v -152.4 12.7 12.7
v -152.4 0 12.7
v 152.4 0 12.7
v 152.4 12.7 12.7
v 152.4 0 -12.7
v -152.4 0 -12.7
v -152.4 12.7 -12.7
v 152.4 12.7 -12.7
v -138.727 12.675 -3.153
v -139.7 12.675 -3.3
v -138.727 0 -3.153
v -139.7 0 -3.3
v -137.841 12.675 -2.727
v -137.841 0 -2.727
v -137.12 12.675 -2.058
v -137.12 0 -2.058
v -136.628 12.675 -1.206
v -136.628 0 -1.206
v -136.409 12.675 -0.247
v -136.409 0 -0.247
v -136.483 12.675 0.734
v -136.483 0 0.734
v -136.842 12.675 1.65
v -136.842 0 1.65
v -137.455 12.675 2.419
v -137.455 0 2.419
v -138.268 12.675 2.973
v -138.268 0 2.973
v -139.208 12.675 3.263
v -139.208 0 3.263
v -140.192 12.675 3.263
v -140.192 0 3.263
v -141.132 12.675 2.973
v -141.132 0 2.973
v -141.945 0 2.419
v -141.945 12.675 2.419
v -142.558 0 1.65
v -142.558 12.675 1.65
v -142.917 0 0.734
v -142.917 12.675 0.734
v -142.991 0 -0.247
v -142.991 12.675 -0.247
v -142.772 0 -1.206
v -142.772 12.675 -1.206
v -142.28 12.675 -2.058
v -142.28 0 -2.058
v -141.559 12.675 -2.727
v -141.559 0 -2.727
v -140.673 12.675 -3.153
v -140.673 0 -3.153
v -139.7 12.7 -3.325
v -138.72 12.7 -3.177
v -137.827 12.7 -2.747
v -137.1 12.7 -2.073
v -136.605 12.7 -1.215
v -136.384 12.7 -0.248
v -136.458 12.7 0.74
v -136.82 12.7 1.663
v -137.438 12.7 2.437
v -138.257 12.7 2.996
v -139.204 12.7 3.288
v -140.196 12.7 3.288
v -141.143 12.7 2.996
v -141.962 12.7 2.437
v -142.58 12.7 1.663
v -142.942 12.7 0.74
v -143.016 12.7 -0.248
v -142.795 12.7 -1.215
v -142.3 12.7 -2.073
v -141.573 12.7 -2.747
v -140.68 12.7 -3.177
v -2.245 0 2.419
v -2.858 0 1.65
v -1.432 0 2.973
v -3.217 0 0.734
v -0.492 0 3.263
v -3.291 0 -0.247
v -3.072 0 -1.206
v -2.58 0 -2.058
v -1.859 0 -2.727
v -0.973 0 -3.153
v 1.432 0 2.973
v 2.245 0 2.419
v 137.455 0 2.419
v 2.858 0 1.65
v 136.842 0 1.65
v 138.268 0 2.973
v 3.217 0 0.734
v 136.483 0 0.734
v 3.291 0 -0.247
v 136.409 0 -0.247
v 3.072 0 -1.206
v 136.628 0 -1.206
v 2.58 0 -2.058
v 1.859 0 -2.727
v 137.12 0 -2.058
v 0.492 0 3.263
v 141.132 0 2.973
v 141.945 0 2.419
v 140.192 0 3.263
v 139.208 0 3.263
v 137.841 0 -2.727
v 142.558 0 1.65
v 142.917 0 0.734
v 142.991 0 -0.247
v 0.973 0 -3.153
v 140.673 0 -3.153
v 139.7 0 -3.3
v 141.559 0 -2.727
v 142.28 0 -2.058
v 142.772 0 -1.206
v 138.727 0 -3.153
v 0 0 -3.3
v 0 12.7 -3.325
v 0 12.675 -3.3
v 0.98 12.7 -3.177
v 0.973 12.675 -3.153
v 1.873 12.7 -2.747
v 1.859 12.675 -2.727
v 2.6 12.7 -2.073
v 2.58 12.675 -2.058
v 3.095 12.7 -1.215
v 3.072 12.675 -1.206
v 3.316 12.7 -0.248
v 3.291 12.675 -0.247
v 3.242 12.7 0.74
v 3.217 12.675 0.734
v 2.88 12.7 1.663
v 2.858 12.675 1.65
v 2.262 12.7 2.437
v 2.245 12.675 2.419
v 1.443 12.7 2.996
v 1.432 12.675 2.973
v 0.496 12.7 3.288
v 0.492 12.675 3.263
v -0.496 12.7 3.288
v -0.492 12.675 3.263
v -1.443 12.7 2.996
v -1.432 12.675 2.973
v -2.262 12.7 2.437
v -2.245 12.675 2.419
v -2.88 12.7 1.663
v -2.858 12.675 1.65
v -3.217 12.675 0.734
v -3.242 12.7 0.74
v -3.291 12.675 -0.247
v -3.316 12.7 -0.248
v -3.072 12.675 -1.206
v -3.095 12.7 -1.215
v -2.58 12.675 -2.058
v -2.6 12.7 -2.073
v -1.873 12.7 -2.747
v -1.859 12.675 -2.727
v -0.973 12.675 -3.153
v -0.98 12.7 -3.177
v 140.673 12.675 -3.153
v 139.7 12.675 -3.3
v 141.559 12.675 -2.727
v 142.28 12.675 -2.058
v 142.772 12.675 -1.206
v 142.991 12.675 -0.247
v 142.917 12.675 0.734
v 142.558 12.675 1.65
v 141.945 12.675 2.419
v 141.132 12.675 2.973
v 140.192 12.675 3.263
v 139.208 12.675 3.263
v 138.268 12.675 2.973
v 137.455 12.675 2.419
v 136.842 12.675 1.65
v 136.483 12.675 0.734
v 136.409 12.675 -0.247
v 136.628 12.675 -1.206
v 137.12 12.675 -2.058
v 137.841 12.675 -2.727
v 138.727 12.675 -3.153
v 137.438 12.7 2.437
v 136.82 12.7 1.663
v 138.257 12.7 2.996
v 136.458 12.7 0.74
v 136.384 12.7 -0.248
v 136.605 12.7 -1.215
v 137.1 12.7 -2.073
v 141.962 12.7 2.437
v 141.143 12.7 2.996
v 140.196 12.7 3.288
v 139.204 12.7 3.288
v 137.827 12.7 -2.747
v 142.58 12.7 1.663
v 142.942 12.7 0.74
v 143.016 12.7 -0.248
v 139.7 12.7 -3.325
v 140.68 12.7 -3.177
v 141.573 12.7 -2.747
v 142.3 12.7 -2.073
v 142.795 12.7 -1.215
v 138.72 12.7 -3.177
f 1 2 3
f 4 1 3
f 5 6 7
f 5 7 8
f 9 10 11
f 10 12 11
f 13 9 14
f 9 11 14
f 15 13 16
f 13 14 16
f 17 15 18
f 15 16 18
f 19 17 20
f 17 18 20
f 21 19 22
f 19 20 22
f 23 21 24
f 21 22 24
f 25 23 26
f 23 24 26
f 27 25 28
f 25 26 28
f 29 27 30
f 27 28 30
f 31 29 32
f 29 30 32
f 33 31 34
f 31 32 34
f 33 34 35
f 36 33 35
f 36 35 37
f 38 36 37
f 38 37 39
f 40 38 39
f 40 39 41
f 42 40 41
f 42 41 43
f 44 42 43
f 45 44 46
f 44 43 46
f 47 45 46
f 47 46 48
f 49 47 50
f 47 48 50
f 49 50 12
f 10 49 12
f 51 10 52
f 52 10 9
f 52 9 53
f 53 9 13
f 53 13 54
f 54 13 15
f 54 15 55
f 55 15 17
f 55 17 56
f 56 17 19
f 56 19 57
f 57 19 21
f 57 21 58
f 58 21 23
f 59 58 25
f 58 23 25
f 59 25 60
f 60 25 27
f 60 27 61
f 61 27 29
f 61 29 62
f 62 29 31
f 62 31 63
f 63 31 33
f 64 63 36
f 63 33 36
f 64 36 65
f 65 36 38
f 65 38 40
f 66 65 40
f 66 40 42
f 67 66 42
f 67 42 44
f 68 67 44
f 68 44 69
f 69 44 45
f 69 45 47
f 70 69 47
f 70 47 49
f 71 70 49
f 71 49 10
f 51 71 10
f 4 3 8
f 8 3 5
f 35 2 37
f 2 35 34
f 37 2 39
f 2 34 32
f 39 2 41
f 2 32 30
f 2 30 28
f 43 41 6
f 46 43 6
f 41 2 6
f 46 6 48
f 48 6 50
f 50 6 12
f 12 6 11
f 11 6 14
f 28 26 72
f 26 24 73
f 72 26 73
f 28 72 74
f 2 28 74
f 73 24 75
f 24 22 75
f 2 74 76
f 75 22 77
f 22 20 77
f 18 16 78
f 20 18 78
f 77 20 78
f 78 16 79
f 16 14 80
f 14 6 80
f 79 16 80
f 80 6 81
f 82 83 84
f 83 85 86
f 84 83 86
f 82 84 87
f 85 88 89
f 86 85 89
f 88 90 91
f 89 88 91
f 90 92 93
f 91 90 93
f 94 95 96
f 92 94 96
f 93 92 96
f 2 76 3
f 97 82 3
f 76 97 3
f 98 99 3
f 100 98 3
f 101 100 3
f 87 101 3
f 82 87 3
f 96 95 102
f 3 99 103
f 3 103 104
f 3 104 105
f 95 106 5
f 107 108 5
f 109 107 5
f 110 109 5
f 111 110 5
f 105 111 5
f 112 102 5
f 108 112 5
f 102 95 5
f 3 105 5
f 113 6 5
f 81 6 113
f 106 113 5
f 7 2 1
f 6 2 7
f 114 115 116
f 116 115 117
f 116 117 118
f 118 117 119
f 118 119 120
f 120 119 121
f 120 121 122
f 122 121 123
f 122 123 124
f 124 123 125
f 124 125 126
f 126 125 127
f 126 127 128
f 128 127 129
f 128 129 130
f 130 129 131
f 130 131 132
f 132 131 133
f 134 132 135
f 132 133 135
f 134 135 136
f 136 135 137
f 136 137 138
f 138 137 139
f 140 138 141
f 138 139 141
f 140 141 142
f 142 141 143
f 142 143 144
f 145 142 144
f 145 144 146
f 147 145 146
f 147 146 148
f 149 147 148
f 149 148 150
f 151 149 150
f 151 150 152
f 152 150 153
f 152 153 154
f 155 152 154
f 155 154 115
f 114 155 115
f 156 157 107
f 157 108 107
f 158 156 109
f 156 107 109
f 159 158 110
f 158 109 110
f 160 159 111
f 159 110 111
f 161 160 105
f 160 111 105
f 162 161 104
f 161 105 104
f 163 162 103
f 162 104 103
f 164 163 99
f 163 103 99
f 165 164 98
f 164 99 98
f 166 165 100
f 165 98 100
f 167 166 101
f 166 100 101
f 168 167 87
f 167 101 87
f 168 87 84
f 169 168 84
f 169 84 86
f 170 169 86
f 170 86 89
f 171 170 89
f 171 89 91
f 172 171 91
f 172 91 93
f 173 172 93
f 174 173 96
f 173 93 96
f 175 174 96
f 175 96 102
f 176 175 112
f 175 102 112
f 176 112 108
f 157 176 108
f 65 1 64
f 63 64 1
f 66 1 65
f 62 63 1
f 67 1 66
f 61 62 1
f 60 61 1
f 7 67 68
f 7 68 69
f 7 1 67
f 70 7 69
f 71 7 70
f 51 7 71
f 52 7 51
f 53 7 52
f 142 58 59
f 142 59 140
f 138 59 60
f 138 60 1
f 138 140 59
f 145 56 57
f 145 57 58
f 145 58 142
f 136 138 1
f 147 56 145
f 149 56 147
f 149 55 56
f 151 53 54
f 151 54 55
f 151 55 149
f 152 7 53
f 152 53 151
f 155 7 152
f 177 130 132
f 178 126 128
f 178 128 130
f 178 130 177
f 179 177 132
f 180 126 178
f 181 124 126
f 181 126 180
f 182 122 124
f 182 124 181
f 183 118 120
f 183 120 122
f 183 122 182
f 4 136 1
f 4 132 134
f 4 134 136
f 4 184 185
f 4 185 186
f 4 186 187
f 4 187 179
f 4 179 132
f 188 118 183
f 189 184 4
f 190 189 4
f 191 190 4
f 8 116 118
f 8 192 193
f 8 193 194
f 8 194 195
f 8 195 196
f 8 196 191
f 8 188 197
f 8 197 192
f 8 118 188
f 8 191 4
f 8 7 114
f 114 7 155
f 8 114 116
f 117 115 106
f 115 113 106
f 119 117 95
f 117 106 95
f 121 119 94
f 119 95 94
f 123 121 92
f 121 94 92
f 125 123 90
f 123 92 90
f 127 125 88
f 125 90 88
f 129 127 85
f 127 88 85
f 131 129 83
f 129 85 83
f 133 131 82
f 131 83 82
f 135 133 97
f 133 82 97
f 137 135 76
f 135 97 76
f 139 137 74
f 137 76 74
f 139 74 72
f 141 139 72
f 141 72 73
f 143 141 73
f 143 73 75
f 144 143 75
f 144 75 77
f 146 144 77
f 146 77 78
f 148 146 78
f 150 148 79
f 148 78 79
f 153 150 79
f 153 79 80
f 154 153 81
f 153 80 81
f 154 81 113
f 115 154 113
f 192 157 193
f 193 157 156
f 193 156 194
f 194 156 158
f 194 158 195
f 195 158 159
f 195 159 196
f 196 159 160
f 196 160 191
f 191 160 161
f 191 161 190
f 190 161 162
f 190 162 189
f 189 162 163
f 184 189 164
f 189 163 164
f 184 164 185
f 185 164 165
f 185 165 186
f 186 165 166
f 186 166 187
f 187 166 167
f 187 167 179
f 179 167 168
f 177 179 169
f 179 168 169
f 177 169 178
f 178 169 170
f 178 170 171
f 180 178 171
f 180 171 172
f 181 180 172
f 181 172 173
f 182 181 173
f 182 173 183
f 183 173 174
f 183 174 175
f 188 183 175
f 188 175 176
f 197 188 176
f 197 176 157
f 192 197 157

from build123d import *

# Parameters (mm, degrees)
SKETCH1_W                      = 304.8
SKETCH1_H                      = 25.4
BOSS_EXTRUDE1_DEPTH            = 12.7
M6_CLEARANCE_HOLE1_D           = 6.6
M6_CLEARANCE_HOLE1_CSINK_D     = 6.65
M6_CLEARANCE_HOLE1_CSINK_ANGLE = 90


with BuildPart() as part:
    # Sketch1 → Boss-Extrude1 (new body)
    with BuildSketch(Plane(origin=(0, 0, 0), x_dir=(1, 0, 0), z_dir=(0, 1, 0))):
        Rectangle(SKETCH1_W, SKETCH1_H)
    extrude(amount=BOSS_EXTRUDE1_DEPTH)

    # M6 Clearance Hole1 (through all)
    with Locations(Plane.ZX.offset(12.7)):
        with Locations((0, 0), (0, -139.7), (0, 139.7)):
            CounterSinkHole(M6_CLEARANCE_HOLE1_D / 2, M6_CLEARANCE_HOLE1_CSINK_D / 2, counter_sink_angle=M6_CLEARANCE_HOLE1_CSINK_ANGLE)


solid = part.part
